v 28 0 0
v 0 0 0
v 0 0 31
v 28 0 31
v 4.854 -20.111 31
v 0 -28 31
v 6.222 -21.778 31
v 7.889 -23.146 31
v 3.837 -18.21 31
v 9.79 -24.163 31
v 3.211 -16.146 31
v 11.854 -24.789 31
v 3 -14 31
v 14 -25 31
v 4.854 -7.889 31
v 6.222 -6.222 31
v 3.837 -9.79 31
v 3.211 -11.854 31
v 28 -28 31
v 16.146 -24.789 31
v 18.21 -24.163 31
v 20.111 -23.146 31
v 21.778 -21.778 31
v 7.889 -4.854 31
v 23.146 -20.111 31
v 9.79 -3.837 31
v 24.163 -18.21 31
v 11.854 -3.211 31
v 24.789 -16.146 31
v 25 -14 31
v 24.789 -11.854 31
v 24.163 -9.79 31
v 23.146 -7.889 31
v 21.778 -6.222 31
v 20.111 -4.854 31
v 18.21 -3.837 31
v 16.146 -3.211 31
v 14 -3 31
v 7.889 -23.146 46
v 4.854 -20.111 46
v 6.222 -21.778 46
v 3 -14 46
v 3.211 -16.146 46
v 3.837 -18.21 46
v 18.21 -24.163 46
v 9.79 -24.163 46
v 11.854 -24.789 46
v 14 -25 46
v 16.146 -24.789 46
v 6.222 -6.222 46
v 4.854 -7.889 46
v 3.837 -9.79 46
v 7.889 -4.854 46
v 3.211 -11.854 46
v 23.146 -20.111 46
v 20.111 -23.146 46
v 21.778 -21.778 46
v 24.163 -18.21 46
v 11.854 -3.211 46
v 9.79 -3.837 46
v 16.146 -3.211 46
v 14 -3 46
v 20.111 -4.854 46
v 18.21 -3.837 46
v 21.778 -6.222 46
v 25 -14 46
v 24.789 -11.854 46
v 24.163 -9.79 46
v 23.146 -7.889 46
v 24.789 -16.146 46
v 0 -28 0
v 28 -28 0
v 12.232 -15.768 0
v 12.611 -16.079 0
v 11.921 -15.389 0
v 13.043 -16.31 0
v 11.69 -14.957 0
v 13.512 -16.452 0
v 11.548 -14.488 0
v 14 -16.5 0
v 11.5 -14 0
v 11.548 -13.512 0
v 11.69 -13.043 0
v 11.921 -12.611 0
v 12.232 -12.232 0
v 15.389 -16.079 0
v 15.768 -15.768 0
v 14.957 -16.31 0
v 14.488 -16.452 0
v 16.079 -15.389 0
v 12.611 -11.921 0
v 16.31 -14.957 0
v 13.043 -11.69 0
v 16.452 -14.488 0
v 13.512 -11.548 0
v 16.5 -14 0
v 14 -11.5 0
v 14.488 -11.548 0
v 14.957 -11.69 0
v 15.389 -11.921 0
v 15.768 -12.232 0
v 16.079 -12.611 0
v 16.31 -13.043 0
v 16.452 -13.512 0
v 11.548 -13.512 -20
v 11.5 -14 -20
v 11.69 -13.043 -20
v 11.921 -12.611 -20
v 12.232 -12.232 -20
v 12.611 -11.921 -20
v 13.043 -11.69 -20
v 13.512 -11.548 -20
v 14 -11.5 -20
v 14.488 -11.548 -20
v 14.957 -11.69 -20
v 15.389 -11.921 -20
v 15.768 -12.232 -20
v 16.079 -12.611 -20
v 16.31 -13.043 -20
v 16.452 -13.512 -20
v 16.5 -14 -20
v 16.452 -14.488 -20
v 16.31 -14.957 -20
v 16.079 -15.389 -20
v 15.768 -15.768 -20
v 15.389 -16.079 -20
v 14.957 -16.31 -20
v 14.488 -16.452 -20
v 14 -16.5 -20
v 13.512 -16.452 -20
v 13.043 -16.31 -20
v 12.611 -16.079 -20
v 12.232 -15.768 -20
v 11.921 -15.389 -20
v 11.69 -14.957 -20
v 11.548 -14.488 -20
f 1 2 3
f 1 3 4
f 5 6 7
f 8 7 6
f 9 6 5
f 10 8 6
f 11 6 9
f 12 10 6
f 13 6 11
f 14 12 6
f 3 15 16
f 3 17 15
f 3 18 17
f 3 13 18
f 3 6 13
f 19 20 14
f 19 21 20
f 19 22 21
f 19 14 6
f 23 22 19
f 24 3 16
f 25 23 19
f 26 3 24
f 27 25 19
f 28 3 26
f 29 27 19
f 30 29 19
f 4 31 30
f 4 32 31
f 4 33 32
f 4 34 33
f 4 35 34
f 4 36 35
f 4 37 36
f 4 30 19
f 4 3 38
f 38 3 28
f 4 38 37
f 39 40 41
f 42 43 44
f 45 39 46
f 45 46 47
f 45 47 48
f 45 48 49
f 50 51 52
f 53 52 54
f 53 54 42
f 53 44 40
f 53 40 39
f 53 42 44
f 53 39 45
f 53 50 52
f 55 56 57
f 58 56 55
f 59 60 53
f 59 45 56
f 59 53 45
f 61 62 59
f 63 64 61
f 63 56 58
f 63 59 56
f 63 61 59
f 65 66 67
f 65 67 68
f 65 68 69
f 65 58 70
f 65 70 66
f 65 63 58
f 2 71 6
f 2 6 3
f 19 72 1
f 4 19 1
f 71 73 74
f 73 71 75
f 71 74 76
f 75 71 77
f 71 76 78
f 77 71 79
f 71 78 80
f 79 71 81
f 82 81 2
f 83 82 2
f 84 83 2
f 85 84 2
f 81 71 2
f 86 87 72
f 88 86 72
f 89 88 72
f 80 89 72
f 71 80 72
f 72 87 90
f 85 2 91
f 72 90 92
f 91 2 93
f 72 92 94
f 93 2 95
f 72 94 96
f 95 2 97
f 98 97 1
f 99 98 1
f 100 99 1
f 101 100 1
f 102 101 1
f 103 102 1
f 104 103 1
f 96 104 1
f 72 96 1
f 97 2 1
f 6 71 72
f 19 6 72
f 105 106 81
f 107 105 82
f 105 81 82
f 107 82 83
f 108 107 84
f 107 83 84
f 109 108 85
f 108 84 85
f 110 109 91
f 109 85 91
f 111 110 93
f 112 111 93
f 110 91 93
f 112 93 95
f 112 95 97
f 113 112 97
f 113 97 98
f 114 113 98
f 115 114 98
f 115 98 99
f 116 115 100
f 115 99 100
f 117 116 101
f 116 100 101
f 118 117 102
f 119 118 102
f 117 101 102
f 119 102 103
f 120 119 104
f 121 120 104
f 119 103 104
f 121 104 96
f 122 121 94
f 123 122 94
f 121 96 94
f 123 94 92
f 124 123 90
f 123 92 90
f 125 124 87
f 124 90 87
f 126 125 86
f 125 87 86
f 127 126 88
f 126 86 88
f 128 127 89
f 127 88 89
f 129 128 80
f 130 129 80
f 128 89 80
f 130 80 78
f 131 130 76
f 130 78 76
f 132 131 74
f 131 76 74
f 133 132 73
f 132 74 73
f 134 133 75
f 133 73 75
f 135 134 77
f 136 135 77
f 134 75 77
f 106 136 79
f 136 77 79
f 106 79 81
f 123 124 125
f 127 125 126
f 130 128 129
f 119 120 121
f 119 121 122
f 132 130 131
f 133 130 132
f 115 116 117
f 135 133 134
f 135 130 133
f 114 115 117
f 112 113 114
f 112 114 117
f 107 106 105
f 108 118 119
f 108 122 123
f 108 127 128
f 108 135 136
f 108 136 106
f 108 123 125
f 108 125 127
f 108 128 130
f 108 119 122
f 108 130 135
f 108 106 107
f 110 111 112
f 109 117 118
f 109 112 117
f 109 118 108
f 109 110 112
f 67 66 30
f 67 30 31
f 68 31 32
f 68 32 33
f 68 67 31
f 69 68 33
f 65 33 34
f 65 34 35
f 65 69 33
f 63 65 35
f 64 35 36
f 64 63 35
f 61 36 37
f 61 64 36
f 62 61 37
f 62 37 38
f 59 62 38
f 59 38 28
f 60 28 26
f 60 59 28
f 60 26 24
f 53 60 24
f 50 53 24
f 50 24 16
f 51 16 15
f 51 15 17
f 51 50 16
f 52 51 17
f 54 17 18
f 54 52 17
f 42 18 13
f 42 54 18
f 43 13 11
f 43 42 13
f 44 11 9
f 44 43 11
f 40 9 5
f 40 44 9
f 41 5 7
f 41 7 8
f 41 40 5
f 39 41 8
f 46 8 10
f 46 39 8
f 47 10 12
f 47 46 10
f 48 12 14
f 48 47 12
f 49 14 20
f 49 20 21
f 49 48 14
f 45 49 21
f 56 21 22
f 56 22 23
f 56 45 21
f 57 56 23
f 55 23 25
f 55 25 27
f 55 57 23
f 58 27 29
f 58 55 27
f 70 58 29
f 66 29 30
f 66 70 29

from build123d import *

# Parameters (mm, degrees)
SKETCH1_W           = 28
SKETCH1_H           = 28
BOSS_EXTRUDE1_DEPTH = 46
SKETCH2_W           = 28
SKETCH2_H           = 28
SKETCH2_R           = 11
CUT_EXTRUDE1_DEPTH  = 15
SKETCH3_R           = 2.5
BOSS_EXTRUDE2_DEPTH = 20


with BuildPart() as part:
    # Sketch1 → Boss-Extrude1 (new body)
    with BuildSketch(Plane.XY):
        with Locations((14, -14)):
            Rectangle(SKETCH1_W, SKETCH1_H)
    extrude(amount=BOSS_EXTRUDE1_DEPTH)

    # Sketch2 → Cut-Extrude1 (cut)
    with BuildSketch(Plane.XY.offset(46)):
        with Locations((14, -14)):
            Rectangle(SKETCH2_W, SKETCH2_H)
        with Locations((14, -14)):
            Circle(SKETCH2_R, mode=Mode.SUBTRACT)
    extrude(amount=-CUT_EXTRUDE1_DEPTH, mode=Mode.SUBTRACT)

    # Sketch3 → Boss-Extrude2 (add)
    with BuildSketch(Plane(origin=(0, 0, 0), x_dir=(-1, 0, 0), z_dir=(0, 0, -1))):
        with Locations((-14, -14)):
            Circle(SKETCH3_R)
    extrude(amount=BOSS_EXTRUDE2_DEPTH)


solid = part.part
